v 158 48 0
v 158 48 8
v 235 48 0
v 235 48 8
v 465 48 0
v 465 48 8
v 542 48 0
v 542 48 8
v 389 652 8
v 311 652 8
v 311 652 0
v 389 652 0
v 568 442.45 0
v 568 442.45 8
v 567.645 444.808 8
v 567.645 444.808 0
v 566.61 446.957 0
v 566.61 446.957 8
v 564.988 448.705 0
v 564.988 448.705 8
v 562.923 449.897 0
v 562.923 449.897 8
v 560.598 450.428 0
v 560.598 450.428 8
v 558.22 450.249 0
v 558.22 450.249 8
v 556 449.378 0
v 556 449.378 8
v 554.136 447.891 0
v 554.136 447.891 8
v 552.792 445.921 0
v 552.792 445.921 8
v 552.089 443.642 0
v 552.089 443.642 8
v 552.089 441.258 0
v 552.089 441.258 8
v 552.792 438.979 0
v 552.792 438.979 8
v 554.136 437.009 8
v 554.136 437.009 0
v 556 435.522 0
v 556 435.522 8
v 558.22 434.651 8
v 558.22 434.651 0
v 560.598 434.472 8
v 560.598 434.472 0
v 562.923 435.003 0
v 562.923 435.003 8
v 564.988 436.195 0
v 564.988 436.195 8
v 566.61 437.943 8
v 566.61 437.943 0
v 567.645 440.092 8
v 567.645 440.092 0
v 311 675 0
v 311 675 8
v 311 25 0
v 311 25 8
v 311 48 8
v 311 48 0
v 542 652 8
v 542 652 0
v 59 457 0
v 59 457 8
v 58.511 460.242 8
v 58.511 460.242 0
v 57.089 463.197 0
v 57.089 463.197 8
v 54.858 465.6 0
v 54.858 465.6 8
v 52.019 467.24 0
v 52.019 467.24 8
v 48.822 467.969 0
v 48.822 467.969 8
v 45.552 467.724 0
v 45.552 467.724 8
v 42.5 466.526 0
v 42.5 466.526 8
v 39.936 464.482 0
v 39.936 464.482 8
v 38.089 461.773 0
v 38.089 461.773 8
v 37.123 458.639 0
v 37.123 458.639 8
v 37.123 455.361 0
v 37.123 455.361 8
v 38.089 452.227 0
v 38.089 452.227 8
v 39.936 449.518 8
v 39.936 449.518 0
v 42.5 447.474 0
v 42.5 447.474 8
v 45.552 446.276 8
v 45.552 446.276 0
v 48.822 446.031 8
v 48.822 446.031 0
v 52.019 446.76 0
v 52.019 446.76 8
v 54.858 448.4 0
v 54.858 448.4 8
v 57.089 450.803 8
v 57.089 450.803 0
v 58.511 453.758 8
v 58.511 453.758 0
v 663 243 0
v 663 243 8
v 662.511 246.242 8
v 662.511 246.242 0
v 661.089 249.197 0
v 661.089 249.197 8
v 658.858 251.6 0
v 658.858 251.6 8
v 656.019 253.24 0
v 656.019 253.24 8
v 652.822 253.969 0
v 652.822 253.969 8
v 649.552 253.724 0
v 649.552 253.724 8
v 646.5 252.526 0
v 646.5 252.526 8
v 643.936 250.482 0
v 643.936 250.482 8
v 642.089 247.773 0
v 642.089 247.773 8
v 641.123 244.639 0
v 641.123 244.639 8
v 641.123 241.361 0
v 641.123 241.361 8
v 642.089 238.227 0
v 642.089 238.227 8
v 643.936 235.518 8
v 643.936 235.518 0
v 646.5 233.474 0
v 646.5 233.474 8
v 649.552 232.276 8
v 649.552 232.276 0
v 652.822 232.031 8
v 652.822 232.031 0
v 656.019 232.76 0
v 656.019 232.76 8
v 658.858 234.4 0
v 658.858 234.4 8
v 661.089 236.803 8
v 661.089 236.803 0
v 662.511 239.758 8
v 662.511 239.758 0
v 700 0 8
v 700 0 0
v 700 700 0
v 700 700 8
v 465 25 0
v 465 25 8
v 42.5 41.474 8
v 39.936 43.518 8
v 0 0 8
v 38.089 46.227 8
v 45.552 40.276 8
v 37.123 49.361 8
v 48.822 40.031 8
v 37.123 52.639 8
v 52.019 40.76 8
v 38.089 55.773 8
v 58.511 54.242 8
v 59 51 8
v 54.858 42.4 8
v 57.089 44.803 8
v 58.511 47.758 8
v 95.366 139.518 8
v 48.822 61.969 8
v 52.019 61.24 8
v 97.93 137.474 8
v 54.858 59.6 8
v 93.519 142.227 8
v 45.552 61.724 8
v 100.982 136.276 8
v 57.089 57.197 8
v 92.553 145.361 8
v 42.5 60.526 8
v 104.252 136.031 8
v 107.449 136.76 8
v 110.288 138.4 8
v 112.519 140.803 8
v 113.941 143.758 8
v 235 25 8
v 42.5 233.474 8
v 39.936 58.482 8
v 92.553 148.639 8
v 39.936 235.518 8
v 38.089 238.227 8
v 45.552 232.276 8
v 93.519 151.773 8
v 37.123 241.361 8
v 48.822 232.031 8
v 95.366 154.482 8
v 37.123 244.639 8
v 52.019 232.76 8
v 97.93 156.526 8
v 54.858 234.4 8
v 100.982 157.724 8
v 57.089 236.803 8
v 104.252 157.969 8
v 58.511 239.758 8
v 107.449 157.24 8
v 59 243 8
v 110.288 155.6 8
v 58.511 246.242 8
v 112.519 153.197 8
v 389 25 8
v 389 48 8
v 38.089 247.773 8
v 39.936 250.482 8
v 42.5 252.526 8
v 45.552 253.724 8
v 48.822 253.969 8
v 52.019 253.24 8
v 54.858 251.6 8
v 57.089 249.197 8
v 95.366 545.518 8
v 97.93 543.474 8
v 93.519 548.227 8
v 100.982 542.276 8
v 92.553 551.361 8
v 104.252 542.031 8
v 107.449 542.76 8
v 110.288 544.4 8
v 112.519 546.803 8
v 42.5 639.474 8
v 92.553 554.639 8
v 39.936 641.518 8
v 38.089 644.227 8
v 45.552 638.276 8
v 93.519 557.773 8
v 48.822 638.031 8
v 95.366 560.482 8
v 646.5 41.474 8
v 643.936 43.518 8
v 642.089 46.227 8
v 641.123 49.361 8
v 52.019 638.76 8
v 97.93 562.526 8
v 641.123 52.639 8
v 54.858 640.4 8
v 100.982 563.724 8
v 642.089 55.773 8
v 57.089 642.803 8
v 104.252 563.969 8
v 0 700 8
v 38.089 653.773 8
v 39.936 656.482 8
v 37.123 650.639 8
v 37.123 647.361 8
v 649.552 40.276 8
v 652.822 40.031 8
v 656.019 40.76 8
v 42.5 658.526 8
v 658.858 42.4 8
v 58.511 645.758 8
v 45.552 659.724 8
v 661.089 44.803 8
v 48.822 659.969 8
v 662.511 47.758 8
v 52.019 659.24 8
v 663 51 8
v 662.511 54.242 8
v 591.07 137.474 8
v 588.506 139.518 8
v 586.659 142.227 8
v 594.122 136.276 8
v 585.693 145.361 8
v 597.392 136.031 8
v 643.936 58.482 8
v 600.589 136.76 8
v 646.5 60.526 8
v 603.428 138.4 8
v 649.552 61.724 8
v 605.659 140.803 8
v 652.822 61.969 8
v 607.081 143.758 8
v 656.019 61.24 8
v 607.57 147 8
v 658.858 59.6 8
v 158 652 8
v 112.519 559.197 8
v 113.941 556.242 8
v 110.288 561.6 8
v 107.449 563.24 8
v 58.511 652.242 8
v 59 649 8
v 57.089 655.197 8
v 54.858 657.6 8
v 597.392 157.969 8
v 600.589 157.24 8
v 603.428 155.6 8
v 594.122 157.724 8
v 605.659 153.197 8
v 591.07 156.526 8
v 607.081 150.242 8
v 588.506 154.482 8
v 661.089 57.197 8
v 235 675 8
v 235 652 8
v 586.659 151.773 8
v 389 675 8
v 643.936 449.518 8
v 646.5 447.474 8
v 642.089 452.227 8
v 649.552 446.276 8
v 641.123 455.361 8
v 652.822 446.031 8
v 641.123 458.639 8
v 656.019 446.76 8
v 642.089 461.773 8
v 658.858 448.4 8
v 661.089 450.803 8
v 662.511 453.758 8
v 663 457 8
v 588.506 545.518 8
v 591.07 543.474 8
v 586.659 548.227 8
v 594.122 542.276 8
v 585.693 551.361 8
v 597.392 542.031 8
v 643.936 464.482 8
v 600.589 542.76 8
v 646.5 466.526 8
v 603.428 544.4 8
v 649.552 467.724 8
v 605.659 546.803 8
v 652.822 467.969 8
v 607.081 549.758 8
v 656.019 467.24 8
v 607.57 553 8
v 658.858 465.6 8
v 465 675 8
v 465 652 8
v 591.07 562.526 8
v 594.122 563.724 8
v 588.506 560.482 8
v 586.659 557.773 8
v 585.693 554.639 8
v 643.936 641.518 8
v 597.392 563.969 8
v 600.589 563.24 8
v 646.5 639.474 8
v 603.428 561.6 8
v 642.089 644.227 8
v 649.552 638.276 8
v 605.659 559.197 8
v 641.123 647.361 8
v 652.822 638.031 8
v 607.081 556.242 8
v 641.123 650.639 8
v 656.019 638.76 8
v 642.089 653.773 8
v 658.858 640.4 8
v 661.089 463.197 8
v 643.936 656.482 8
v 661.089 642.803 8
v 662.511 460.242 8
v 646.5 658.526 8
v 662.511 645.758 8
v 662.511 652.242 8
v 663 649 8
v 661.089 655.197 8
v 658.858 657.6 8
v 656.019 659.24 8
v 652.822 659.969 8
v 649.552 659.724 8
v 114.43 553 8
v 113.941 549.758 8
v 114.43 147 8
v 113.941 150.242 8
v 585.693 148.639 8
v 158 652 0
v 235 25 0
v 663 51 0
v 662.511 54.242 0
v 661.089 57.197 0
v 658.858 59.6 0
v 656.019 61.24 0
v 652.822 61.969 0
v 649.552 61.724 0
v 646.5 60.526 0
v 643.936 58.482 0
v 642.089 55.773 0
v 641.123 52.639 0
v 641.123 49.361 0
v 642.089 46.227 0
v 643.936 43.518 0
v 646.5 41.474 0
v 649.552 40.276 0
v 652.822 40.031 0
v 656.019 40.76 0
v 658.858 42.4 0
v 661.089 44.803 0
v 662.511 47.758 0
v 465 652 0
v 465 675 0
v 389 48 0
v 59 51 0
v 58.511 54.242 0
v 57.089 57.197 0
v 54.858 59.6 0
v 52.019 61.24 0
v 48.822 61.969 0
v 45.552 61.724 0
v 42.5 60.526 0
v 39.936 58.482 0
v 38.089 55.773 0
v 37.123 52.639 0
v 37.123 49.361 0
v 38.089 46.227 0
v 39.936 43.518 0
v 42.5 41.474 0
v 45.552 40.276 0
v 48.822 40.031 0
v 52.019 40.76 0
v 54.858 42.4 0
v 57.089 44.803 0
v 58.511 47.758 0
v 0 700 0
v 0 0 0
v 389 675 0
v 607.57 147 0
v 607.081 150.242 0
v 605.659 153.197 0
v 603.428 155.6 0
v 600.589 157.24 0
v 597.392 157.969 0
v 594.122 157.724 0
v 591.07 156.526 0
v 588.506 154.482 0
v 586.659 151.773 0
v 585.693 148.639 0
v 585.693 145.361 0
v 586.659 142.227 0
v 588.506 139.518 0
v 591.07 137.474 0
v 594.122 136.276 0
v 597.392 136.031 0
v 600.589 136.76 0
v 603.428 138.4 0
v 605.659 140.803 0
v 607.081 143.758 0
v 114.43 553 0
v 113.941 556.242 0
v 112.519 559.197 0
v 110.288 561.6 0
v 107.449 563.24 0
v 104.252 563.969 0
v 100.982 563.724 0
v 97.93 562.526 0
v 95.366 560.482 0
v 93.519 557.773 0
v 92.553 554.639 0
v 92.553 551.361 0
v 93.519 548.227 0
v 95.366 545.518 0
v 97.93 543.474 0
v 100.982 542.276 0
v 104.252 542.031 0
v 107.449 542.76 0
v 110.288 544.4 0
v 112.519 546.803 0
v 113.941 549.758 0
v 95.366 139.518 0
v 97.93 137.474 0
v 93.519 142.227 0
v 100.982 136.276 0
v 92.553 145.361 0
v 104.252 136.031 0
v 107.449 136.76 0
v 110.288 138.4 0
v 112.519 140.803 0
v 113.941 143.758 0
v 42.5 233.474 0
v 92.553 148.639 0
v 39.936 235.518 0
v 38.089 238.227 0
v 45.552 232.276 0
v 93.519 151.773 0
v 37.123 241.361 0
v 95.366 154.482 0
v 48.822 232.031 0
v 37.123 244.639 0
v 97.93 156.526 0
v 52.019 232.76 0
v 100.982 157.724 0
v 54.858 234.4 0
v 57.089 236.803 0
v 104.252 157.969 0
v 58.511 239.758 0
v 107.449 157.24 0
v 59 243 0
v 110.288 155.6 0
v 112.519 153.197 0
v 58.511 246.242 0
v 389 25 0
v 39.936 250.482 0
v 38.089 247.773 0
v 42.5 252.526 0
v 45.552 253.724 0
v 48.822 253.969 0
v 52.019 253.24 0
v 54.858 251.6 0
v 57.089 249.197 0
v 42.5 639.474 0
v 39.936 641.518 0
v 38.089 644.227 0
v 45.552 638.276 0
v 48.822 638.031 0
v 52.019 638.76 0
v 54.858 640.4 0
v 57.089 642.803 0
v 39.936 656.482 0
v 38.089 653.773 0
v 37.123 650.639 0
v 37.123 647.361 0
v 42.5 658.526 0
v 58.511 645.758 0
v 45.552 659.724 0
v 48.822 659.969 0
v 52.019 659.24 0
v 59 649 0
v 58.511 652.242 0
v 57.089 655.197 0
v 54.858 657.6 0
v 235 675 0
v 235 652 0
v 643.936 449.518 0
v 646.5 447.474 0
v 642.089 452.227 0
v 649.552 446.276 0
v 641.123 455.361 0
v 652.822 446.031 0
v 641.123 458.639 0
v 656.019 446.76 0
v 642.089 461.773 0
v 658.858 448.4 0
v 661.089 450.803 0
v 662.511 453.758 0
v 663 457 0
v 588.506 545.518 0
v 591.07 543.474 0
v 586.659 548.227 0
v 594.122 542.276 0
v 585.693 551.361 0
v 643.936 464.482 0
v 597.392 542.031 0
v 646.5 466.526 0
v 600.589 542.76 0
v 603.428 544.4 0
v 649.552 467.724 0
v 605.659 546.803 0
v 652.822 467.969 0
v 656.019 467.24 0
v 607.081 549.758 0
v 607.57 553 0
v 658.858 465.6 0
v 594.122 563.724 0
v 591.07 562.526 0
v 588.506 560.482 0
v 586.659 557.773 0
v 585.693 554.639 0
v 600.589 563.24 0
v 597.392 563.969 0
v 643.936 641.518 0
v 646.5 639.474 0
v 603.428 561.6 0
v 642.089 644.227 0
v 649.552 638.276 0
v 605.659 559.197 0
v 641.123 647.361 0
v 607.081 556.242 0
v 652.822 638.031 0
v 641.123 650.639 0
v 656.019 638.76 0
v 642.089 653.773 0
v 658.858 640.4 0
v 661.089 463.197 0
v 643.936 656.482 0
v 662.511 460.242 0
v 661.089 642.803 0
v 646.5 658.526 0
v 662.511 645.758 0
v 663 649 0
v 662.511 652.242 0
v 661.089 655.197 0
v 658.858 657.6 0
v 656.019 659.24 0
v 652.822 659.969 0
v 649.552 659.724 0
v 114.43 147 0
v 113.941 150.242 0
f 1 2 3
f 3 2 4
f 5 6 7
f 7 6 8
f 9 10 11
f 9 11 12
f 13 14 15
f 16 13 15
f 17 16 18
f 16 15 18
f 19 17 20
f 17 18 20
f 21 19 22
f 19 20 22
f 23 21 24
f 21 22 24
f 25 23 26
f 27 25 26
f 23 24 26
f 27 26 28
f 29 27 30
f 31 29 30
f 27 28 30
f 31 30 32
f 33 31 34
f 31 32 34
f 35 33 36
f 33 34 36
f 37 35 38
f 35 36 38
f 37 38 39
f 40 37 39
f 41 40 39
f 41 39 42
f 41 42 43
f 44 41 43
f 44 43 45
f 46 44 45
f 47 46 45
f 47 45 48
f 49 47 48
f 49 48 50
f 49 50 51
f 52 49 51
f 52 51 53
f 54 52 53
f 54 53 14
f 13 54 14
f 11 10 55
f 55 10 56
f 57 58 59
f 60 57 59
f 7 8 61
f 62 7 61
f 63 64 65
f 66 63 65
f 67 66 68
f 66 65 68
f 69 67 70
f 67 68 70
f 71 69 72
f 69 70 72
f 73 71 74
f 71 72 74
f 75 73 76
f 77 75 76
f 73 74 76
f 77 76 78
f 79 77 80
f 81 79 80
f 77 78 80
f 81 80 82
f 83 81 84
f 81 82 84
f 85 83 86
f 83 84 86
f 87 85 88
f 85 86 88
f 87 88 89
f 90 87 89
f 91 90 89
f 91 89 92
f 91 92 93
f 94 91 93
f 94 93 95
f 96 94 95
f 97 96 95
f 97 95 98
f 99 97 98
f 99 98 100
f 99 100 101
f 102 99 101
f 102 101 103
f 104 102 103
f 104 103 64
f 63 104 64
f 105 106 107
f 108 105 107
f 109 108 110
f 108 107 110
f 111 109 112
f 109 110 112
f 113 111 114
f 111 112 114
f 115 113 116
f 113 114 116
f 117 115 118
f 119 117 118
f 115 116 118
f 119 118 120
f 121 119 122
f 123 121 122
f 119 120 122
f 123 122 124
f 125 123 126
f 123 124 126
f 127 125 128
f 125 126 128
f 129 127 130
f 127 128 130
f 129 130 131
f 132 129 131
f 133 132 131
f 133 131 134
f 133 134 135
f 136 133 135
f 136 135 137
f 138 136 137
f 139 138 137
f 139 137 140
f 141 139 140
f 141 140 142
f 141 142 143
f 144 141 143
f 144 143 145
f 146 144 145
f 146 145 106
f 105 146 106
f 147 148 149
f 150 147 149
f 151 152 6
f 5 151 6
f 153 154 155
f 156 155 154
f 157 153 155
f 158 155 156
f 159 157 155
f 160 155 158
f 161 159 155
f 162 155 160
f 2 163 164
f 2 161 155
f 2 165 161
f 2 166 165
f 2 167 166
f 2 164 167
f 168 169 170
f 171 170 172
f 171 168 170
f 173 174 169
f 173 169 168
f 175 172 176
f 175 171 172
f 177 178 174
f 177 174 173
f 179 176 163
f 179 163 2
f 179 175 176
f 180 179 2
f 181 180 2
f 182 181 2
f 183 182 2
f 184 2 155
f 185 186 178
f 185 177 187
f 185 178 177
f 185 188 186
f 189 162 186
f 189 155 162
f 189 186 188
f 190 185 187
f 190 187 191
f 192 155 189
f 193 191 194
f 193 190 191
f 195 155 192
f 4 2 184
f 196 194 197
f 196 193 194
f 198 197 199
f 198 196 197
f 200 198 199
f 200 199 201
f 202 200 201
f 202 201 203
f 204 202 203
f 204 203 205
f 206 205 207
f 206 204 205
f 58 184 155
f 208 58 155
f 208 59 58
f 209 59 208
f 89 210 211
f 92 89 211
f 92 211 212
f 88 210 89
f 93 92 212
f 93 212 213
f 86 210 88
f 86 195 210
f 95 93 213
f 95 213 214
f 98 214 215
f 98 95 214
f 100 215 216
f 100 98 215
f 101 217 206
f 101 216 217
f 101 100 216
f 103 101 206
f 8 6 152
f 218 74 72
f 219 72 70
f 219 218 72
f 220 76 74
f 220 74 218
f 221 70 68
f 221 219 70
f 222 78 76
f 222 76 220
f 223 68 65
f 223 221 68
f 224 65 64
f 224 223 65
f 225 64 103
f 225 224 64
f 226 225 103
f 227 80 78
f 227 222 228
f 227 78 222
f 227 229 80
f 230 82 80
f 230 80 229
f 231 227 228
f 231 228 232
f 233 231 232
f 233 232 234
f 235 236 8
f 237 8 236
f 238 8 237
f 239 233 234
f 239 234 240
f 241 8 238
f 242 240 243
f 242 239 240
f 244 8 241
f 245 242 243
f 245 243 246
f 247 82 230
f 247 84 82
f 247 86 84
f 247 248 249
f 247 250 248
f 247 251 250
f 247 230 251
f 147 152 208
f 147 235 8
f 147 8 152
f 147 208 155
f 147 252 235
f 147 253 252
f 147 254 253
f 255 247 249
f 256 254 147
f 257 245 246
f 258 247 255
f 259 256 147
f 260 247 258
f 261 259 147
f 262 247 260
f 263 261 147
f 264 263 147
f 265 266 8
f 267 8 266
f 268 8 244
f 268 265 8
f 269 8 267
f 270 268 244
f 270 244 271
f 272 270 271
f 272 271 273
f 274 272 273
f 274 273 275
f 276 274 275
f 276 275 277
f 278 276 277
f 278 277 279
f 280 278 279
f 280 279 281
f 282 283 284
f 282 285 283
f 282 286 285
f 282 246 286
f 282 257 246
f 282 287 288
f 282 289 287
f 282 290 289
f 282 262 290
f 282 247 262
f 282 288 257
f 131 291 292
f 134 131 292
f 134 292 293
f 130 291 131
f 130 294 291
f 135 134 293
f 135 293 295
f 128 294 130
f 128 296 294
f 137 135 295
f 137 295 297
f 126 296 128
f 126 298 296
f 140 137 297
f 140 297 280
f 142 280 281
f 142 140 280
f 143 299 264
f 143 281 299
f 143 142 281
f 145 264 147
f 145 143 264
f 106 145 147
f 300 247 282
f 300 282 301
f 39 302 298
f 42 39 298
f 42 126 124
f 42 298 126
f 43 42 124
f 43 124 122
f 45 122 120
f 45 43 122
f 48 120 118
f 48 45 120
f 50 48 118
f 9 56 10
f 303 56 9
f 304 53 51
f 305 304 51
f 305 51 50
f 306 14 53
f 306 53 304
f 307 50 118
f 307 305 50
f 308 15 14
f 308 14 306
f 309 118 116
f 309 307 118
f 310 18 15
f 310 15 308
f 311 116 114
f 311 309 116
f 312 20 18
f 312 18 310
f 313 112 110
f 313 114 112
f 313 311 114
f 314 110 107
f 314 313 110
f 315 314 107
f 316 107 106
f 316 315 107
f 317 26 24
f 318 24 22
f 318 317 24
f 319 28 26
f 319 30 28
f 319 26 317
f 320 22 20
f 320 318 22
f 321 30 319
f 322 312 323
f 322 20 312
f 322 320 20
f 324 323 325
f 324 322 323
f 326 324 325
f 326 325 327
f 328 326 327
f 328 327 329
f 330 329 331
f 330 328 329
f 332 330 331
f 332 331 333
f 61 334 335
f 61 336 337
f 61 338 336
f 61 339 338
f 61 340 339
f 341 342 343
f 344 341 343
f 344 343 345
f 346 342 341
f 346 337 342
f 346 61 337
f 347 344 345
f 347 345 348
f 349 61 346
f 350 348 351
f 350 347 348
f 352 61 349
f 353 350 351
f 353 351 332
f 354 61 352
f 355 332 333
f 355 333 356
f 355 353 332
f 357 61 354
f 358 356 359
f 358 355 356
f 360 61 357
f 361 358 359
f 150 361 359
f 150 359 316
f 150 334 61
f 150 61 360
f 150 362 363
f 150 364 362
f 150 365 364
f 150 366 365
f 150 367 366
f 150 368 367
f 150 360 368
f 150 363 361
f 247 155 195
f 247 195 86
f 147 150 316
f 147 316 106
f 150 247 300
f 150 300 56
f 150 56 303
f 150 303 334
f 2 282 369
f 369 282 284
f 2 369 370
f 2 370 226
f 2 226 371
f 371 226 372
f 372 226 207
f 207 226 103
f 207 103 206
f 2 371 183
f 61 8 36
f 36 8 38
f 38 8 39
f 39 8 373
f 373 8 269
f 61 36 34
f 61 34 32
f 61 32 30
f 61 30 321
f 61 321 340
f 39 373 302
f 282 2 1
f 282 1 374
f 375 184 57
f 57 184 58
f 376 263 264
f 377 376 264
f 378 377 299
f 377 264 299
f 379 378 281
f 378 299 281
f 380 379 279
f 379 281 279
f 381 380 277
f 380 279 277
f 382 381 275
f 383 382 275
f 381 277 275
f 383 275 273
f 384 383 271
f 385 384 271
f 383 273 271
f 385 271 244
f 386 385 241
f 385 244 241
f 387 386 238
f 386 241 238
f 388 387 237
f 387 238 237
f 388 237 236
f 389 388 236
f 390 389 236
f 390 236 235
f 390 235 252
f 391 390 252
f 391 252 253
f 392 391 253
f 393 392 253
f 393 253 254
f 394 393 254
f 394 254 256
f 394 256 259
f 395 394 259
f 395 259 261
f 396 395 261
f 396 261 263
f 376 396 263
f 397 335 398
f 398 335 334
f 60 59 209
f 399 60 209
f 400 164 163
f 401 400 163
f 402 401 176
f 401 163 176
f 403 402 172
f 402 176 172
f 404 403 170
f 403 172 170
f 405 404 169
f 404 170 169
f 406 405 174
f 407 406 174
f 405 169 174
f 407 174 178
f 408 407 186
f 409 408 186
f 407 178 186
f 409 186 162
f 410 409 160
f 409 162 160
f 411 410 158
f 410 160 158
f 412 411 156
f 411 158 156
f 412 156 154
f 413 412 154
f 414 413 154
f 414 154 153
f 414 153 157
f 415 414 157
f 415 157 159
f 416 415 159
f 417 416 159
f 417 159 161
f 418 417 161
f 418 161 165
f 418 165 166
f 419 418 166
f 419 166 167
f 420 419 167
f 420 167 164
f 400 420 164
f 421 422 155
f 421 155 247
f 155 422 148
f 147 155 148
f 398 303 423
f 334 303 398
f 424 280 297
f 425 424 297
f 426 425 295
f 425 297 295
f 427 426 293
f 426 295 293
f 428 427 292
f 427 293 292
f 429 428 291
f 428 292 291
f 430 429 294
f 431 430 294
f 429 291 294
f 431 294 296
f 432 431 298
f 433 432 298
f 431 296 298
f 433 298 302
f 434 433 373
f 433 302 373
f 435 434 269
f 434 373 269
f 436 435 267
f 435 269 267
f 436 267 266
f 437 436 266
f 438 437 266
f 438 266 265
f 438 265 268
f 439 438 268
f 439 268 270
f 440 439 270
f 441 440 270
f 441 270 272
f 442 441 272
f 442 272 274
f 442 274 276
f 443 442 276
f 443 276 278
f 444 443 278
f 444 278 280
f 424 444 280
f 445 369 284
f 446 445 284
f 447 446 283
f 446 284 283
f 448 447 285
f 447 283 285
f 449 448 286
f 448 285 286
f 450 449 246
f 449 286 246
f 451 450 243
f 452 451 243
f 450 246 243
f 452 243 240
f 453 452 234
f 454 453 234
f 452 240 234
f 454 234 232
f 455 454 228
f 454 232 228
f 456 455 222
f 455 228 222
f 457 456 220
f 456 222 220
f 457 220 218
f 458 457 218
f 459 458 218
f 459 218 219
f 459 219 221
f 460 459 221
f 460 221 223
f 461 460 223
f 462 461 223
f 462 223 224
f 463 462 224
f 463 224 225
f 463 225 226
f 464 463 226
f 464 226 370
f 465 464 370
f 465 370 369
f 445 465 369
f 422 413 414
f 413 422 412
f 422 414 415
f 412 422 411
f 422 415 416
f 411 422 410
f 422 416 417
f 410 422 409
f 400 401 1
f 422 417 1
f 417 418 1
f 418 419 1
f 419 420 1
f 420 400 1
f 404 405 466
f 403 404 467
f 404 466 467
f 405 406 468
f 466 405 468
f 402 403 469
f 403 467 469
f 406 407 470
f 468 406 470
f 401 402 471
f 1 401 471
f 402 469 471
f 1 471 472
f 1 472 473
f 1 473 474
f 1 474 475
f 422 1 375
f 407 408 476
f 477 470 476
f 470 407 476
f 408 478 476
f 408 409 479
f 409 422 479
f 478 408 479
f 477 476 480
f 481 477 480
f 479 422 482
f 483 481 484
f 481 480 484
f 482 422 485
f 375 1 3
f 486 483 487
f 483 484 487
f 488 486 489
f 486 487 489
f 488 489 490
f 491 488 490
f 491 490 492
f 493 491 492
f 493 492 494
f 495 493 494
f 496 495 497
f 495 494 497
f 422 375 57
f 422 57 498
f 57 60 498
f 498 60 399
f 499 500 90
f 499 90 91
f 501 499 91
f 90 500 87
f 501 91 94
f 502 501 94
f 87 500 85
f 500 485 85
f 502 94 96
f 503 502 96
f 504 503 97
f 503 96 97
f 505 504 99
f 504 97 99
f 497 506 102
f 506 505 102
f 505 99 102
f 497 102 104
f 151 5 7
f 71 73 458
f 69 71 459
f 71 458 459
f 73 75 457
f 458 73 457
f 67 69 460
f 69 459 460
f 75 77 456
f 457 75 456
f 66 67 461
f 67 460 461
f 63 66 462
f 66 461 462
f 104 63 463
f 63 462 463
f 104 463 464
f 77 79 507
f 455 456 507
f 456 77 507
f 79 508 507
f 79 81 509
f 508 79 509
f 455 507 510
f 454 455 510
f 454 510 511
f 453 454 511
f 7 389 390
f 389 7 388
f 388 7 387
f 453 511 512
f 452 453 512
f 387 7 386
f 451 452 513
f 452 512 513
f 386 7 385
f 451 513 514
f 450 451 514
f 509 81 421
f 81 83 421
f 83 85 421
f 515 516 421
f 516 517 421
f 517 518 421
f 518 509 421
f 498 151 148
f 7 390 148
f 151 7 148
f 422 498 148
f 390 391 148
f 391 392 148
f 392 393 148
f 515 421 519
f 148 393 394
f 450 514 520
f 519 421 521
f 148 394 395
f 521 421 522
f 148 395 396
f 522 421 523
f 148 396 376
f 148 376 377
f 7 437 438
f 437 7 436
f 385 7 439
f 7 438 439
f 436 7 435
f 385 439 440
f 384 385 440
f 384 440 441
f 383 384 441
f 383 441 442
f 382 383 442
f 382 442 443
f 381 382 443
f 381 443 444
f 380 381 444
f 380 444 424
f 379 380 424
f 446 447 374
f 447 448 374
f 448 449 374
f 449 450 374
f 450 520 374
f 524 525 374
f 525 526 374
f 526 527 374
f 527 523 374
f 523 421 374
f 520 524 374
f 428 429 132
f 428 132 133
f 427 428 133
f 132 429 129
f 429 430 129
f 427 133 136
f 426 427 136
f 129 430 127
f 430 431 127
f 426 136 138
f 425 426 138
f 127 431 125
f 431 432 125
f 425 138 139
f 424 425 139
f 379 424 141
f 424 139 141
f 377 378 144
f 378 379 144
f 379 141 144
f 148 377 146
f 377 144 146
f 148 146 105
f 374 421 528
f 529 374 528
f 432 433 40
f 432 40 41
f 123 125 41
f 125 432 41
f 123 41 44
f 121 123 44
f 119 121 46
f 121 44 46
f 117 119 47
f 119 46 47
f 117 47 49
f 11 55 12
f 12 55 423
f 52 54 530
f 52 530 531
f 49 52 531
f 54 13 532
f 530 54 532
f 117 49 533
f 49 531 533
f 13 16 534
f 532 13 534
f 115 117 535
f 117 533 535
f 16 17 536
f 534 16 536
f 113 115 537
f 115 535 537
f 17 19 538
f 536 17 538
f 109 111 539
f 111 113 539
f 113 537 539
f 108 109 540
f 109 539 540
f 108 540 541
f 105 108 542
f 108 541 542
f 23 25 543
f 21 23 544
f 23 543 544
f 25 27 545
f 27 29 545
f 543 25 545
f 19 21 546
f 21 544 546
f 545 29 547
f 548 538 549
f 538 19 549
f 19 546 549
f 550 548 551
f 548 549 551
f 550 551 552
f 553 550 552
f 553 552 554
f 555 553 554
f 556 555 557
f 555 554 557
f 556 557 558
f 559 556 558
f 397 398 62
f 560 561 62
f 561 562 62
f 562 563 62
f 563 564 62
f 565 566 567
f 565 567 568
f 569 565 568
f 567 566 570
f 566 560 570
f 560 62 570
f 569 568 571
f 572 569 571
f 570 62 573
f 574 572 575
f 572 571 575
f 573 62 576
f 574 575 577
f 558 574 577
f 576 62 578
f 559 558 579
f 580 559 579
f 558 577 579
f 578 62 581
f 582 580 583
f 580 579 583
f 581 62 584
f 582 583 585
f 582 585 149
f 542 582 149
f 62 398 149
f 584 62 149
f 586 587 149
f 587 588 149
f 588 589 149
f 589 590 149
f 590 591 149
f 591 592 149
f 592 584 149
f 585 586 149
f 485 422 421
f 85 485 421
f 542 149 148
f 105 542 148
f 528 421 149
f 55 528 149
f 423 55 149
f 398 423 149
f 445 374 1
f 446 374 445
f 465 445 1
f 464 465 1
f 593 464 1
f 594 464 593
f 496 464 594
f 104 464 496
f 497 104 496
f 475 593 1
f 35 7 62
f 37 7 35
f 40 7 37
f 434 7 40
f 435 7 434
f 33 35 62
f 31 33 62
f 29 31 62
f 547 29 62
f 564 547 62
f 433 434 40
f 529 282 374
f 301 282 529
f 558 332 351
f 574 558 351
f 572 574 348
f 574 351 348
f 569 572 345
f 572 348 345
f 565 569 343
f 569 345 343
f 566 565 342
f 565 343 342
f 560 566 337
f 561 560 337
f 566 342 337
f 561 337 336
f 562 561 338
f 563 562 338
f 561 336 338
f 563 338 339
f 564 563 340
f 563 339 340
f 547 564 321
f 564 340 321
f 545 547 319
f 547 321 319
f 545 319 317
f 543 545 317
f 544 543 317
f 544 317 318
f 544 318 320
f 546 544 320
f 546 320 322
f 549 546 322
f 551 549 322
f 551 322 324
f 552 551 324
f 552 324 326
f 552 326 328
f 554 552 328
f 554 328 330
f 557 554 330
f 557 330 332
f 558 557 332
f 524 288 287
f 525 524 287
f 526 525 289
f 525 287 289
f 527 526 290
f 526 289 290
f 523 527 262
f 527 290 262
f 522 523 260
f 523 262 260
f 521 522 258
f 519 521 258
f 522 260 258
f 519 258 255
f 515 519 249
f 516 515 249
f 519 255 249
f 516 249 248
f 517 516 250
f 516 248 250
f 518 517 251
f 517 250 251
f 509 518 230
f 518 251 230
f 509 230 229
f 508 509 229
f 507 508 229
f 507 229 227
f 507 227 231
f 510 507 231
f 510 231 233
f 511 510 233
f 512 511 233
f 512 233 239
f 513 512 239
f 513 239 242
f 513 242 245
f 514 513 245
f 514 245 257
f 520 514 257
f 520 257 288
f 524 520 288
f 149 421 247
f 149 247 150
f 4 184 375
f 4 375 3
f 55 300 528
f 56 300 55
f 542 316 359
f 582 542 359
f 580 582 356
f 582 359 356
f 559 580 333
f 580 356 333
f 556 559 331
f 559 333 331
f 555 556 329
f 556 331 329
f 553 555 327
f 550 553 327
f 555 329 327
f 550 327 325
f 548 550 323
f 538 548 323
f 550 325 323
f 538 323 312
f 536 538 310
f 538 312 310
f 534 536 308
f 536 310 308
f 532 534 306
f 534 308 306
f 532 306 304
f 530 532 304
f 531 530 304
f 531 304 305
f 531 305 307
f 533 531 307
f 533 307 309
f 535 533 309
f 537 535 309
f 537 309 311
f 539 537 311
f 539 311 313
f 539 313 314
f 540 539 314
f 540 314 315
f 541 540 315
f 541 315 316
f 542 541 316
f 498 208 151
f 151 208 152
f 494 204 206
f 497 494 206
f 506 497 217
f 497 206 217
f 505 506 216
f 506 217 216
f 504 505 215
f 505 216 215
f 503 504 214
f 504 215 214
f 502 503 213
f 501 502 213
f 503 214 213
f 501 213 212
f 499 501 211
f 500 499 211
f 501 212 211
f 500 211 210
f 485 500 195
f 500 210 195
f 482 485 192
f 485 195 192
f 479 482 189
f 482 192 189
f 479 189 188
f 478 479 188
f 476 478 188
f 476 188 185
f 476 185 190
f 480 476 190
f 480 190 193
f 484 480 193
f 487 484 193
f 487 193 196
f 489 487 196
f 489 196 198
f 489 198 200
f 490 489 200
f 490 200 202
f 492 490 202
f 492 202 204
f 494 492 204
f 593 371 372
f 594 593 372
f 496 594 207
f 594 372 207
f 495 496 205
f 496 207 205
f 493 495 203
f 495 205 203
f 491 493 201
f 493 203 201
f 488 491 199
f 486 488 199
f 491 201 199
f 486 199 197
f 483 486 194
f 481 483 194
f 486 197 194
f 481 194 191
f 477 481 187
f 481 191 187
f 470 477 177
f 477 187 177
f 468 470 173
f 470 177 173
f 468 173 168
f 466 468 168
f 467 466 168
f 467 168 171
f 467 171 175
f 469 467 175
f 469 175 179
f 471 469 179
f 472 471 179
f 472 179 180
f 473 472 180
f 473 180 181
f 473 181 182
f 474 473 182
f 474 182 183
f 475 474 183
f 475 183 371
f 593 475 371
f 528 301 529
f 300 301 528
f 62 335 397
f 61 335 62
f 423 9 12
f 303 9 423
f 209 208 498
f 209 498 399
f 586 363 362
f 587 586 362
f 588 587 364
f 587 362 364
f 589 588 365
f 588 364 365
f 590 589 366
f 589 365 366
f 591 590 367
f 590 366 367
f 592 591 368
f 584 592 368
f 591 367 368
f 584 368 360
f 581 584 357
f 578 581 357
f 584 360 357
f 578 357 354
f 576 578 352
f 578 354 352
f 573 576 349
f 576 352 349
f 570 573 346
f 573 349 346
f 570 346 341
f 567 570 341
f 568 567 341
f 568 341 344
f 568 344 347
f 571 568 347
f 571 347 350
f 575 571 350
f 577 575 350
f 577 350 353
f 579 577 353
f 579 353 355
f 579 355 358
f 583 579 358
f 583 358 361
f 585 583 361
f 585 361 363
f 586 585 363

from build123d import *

# Parameters (mm, degrees)
SKETCH_1_W                      = 700
SKETCH_1_H                      = 700
CONNECTION_PLATE_DEPTH          = 8
SKETCH_2_W                      = 76
SKETCH_2_H                      = 300
ACCESS_WINDOW_DEPTH             = 990.981818015
SKETCH_3_W                      = 76
SKETCH_3_H                      = 300
CUT_EXTRUDE_2_DEPTH             = 990.981818015
SKETCH_4_W                      = 76
SKETCH_4_H                      = 300
CUT_EXTRUDE_3_DEPTH             = 990.981818015
SKETCH_5_W                      = 76
SKETCH_5_H                      = 300
CUT_EXTRUDE_4_DEPTH             = 990.981818015
SKETCH_6_R                      = 11
SHAFT_CLEARANCE_DEPTH           = 990.981818015
SKETCH_7_R                      = 11
CUT_EXTRUDE_6_DEPTH             = 990.981818015
SKETCH_8_R                      = 11
CUT_EXTRUDE_7_DEPTH             = 990.981818015
SKETCH_9_R                      = 11
CUT_EXTRUDE_8_DEPTH             = 990.981818015
SKETCH_10_R                     = 11
CUT_EXTRUDE_9_DEPTH             = 990.981818015
SKETCH_11_R                     = 11
CUT_EXTRUDE_10_DEPTH            = 990.981818015
SKETCH_12_R                     = 11
CUT_EXTRUDE_11_DEPTH            = 990.981818015
SKETCH_13_R                     = 11
CUT_EXTRUDE_12_DEPTH            = 990.981818015
SKETCH_14_R                     = 11
CUT_EXTRUDE_13_DEPTH            = 990.981818015
SKETCH_15_R                     = 11
CUT_EXTRUDE_14_DEPTH            = 990.981818015
SKETCH_16_R                     = 11
CUT_EXTRUDE_15_DEPTH            = 990.981818015
SKETCH_17_R                     = 11
CUT_EXTRUDE_16_DEPTH            = 990.981818015
SKETCH_18_W                     = 384
SKETCH_18_H                     = 604
FLOAT_INSTALLATION_WINDOW_DEPTH = 990.981818015
SKETCH_19_R                     = 8
COMMS_PASSAGE_DEPTH             = 990.981818015


with BuildPart() as part:
    # 草图1 → Connection_plate (new body)
    with BuildSketch(Plane.XY):
        with Locations((350, 350)):
            Rectangle(SKETCH_1_W, SKETCH_1_H)
    extrude(amount=CONNECTION_PLATE_DEPTH)

    # 草图2 → Access_window (cut, through all)
    with BuildSketch(Plane.XY.offset(8)):
        with Locations((273, 175)):
            Rectangle(SKETCH_2_W, SKETCH_2_H)
    extrude(amount=-ACCESS_WINDOW_DEPTH, mode=Mode.SUBTRACT)

    # 草图3 → 切除-拉伸2 (cut, through all)
    with BuildSketch(Plane.XY.offset(8)):
        with Locations((273, 525)):
            Rectangle(SKETCH_3_W, SKETCH_3_H)
    extrude(amount=-CUT_EXTRUDE_2_DEPTH, mode=Mode.SUBTRACT)

    # 草图4 → 切除-拉伸3 (cut, through all)
    with BuildSketch(Plane.XY.offset(8)):
        with Locations((427, 175)):
            Rectangle(SKETCH_4_W, SKETCH_4_H)
    extrude(amount=-CUT_EXTRUDE_3_DEPTH, mode=Mode.SUBTRACT)

    # 草图5 → 切除-拉伸4 (cut, through all)
    with BuildSketch(Plane.XY.offset(8)):
        with Locations((427, 525)):
            Rectangle(SKETCH_5_W, SKETCH_5_H)
    extrude(amount=-CUT_EXTRUDE_4_DEPTH, mode=Mode.SUBTRACT)

    # 草图6 → Shaft_clearance (cut, through all)
    with BuildSketch(Plane.XY.offset(8)):
        with Locations((48, 51)):
            Circle(SKETCH_6_R)
    extrude(amount=-SHAFT_CLEARANCE_DEPTH, mode=Mode.SUBTRACT)

    # 草图7 → 切除-拉伸6 (cut, through all)
    with BuildSketch(Plane.XY.offset(8)):
        with Locations((48, 243)):
            Circle(SKETCH_7_R)
    extrude(amount=-CUT_EXTRUDE_6_DEPTH, mode=Mode.SUBTRACT)

    # 草图8 → 切除-拉伸7 (cut, through all)
    with BuildSketch(Plane.XY.offset(8)):
        with Locations((48, 457)):
            Circle(SKETCH_8_R)
    extrude(amount=-CUT_EXTRUDE_7_DEPTH, mode=Mode.SUBTRACT)

    # 草图9 → 切除-拉伸8 (cut, through all)
    with BuildSketch(Plane.XY.offset(8)):
        with Locations((48, 649)):
            Circle(SKETCH_9_R)
    extrude(amount=-CUT_EXTRUDE_8_DEPTH, mode=Mode.SUBTRACT)

    # 草图10 → 切除-拉伸9 (cut, through all)
    with BuildSketch(Plane.XY.offset(8)):
        with Locations((103.43, 147)):
            Circle(SKETCH_10_R)
    extrude(amount=-CUT_EXTRUDE_9_DEPTH, mode=Mode.SUBTRACT)

    # 草图11 → 切除-拉伸10 (cut, through all)
    with BuildSketch(Plane.XY.offset(8)):
        with Locations((103.43, 553)):
            Circle(SKETCH_11_R)
    extrude(amount=-CUT_EXTRUDE_10_DEPTH, mode=Mode.SUBTRACT)

    # 草图12 → 切除-拉伸11 (cut, through all)
    with BuildSketch(Plane.XY.offset(8)):
        with Locations((652, 51)):
            Circle(SKETCH_12_R)
    extrude(amount=-CUT_EXTRUDE_11_DEPTH, mode=Mode.SUBTRACT)

    # 草图13 → 切除-拉伸12 (cut, through all)
    with BuildSketch(Plane.XY.offset(8)):
        with Locations((652, 243)):
            Circle(SKETCH_13_R)
    extrude(amount=-CUT_EXTRUDE_12_DEPTH, mode=Mode.SUBTRACT)

    # 草图14 → 切除-拉伸13 (cut, through all)
    with BuildSketch(Plane.XY.offset(8)):
        with Locations((652, 457)):
            Circle(SKETCH_14_R)
    extrude(amount=-CUT_EXTRUDE_13_DEPTH, mode=Mode.SUBTRACT)

    # 草图15 → 切除-拉伸14 (cut, through all)
    with BuildSketch(Plane.XY.offset(8)):
        with Locations((652, 649)):
            Circle(SKETCH_15_R)
    extrude(amount=-CUT_EXTRUDE_14_DEPTH, mode=Mode.SUBTRACT)

    # 草图16 → 切除-拉伸15 (cut, through all)
    with BuildSketch(Plane.XY.offset(8)):
        with Locations((596.57, 147)):
            Circle(SKETCH_16_R)
    extrude(amount=-CUT_EXTRUDE_15_DEPTH, mode=Mode.SUBTRACT)

    # 草图17 → 切除-拉伸16 (cut, through all)
    with BuildSketch(Plane.XY.offset(8)):
        with Locations((596.57, 553)):
            Circle(SKETCH_17_R)
    extrude(amount=-CUT_EXTRUDE_16_DEPTH, mode=Mode.SUBTRACT)

    # 草图18 → Float_installation_window (cut, through all)
    with BuildSketch(Plane.XY.offset(8)):
        with Locations((350, 350)):
            Rectangle(SKETCH_18_W, SKETCH_18_H)
    extrude(amount=-FLOAT_INSTALLATION_WINDOW_DEPTH, mode=Mode.SUBTRACT)

    # 草图19 → Comms_passage (cut, through all)
    with BuildSketch(Plane.XY.offset(8)):
        with Locations((560, 442.45)):
            Circle(SKETCH_19_R)
    extrude(amount=-COMMS_PASSAGE_DEPTH, mode=Mode.SUBTRACT)


solid = part.part
